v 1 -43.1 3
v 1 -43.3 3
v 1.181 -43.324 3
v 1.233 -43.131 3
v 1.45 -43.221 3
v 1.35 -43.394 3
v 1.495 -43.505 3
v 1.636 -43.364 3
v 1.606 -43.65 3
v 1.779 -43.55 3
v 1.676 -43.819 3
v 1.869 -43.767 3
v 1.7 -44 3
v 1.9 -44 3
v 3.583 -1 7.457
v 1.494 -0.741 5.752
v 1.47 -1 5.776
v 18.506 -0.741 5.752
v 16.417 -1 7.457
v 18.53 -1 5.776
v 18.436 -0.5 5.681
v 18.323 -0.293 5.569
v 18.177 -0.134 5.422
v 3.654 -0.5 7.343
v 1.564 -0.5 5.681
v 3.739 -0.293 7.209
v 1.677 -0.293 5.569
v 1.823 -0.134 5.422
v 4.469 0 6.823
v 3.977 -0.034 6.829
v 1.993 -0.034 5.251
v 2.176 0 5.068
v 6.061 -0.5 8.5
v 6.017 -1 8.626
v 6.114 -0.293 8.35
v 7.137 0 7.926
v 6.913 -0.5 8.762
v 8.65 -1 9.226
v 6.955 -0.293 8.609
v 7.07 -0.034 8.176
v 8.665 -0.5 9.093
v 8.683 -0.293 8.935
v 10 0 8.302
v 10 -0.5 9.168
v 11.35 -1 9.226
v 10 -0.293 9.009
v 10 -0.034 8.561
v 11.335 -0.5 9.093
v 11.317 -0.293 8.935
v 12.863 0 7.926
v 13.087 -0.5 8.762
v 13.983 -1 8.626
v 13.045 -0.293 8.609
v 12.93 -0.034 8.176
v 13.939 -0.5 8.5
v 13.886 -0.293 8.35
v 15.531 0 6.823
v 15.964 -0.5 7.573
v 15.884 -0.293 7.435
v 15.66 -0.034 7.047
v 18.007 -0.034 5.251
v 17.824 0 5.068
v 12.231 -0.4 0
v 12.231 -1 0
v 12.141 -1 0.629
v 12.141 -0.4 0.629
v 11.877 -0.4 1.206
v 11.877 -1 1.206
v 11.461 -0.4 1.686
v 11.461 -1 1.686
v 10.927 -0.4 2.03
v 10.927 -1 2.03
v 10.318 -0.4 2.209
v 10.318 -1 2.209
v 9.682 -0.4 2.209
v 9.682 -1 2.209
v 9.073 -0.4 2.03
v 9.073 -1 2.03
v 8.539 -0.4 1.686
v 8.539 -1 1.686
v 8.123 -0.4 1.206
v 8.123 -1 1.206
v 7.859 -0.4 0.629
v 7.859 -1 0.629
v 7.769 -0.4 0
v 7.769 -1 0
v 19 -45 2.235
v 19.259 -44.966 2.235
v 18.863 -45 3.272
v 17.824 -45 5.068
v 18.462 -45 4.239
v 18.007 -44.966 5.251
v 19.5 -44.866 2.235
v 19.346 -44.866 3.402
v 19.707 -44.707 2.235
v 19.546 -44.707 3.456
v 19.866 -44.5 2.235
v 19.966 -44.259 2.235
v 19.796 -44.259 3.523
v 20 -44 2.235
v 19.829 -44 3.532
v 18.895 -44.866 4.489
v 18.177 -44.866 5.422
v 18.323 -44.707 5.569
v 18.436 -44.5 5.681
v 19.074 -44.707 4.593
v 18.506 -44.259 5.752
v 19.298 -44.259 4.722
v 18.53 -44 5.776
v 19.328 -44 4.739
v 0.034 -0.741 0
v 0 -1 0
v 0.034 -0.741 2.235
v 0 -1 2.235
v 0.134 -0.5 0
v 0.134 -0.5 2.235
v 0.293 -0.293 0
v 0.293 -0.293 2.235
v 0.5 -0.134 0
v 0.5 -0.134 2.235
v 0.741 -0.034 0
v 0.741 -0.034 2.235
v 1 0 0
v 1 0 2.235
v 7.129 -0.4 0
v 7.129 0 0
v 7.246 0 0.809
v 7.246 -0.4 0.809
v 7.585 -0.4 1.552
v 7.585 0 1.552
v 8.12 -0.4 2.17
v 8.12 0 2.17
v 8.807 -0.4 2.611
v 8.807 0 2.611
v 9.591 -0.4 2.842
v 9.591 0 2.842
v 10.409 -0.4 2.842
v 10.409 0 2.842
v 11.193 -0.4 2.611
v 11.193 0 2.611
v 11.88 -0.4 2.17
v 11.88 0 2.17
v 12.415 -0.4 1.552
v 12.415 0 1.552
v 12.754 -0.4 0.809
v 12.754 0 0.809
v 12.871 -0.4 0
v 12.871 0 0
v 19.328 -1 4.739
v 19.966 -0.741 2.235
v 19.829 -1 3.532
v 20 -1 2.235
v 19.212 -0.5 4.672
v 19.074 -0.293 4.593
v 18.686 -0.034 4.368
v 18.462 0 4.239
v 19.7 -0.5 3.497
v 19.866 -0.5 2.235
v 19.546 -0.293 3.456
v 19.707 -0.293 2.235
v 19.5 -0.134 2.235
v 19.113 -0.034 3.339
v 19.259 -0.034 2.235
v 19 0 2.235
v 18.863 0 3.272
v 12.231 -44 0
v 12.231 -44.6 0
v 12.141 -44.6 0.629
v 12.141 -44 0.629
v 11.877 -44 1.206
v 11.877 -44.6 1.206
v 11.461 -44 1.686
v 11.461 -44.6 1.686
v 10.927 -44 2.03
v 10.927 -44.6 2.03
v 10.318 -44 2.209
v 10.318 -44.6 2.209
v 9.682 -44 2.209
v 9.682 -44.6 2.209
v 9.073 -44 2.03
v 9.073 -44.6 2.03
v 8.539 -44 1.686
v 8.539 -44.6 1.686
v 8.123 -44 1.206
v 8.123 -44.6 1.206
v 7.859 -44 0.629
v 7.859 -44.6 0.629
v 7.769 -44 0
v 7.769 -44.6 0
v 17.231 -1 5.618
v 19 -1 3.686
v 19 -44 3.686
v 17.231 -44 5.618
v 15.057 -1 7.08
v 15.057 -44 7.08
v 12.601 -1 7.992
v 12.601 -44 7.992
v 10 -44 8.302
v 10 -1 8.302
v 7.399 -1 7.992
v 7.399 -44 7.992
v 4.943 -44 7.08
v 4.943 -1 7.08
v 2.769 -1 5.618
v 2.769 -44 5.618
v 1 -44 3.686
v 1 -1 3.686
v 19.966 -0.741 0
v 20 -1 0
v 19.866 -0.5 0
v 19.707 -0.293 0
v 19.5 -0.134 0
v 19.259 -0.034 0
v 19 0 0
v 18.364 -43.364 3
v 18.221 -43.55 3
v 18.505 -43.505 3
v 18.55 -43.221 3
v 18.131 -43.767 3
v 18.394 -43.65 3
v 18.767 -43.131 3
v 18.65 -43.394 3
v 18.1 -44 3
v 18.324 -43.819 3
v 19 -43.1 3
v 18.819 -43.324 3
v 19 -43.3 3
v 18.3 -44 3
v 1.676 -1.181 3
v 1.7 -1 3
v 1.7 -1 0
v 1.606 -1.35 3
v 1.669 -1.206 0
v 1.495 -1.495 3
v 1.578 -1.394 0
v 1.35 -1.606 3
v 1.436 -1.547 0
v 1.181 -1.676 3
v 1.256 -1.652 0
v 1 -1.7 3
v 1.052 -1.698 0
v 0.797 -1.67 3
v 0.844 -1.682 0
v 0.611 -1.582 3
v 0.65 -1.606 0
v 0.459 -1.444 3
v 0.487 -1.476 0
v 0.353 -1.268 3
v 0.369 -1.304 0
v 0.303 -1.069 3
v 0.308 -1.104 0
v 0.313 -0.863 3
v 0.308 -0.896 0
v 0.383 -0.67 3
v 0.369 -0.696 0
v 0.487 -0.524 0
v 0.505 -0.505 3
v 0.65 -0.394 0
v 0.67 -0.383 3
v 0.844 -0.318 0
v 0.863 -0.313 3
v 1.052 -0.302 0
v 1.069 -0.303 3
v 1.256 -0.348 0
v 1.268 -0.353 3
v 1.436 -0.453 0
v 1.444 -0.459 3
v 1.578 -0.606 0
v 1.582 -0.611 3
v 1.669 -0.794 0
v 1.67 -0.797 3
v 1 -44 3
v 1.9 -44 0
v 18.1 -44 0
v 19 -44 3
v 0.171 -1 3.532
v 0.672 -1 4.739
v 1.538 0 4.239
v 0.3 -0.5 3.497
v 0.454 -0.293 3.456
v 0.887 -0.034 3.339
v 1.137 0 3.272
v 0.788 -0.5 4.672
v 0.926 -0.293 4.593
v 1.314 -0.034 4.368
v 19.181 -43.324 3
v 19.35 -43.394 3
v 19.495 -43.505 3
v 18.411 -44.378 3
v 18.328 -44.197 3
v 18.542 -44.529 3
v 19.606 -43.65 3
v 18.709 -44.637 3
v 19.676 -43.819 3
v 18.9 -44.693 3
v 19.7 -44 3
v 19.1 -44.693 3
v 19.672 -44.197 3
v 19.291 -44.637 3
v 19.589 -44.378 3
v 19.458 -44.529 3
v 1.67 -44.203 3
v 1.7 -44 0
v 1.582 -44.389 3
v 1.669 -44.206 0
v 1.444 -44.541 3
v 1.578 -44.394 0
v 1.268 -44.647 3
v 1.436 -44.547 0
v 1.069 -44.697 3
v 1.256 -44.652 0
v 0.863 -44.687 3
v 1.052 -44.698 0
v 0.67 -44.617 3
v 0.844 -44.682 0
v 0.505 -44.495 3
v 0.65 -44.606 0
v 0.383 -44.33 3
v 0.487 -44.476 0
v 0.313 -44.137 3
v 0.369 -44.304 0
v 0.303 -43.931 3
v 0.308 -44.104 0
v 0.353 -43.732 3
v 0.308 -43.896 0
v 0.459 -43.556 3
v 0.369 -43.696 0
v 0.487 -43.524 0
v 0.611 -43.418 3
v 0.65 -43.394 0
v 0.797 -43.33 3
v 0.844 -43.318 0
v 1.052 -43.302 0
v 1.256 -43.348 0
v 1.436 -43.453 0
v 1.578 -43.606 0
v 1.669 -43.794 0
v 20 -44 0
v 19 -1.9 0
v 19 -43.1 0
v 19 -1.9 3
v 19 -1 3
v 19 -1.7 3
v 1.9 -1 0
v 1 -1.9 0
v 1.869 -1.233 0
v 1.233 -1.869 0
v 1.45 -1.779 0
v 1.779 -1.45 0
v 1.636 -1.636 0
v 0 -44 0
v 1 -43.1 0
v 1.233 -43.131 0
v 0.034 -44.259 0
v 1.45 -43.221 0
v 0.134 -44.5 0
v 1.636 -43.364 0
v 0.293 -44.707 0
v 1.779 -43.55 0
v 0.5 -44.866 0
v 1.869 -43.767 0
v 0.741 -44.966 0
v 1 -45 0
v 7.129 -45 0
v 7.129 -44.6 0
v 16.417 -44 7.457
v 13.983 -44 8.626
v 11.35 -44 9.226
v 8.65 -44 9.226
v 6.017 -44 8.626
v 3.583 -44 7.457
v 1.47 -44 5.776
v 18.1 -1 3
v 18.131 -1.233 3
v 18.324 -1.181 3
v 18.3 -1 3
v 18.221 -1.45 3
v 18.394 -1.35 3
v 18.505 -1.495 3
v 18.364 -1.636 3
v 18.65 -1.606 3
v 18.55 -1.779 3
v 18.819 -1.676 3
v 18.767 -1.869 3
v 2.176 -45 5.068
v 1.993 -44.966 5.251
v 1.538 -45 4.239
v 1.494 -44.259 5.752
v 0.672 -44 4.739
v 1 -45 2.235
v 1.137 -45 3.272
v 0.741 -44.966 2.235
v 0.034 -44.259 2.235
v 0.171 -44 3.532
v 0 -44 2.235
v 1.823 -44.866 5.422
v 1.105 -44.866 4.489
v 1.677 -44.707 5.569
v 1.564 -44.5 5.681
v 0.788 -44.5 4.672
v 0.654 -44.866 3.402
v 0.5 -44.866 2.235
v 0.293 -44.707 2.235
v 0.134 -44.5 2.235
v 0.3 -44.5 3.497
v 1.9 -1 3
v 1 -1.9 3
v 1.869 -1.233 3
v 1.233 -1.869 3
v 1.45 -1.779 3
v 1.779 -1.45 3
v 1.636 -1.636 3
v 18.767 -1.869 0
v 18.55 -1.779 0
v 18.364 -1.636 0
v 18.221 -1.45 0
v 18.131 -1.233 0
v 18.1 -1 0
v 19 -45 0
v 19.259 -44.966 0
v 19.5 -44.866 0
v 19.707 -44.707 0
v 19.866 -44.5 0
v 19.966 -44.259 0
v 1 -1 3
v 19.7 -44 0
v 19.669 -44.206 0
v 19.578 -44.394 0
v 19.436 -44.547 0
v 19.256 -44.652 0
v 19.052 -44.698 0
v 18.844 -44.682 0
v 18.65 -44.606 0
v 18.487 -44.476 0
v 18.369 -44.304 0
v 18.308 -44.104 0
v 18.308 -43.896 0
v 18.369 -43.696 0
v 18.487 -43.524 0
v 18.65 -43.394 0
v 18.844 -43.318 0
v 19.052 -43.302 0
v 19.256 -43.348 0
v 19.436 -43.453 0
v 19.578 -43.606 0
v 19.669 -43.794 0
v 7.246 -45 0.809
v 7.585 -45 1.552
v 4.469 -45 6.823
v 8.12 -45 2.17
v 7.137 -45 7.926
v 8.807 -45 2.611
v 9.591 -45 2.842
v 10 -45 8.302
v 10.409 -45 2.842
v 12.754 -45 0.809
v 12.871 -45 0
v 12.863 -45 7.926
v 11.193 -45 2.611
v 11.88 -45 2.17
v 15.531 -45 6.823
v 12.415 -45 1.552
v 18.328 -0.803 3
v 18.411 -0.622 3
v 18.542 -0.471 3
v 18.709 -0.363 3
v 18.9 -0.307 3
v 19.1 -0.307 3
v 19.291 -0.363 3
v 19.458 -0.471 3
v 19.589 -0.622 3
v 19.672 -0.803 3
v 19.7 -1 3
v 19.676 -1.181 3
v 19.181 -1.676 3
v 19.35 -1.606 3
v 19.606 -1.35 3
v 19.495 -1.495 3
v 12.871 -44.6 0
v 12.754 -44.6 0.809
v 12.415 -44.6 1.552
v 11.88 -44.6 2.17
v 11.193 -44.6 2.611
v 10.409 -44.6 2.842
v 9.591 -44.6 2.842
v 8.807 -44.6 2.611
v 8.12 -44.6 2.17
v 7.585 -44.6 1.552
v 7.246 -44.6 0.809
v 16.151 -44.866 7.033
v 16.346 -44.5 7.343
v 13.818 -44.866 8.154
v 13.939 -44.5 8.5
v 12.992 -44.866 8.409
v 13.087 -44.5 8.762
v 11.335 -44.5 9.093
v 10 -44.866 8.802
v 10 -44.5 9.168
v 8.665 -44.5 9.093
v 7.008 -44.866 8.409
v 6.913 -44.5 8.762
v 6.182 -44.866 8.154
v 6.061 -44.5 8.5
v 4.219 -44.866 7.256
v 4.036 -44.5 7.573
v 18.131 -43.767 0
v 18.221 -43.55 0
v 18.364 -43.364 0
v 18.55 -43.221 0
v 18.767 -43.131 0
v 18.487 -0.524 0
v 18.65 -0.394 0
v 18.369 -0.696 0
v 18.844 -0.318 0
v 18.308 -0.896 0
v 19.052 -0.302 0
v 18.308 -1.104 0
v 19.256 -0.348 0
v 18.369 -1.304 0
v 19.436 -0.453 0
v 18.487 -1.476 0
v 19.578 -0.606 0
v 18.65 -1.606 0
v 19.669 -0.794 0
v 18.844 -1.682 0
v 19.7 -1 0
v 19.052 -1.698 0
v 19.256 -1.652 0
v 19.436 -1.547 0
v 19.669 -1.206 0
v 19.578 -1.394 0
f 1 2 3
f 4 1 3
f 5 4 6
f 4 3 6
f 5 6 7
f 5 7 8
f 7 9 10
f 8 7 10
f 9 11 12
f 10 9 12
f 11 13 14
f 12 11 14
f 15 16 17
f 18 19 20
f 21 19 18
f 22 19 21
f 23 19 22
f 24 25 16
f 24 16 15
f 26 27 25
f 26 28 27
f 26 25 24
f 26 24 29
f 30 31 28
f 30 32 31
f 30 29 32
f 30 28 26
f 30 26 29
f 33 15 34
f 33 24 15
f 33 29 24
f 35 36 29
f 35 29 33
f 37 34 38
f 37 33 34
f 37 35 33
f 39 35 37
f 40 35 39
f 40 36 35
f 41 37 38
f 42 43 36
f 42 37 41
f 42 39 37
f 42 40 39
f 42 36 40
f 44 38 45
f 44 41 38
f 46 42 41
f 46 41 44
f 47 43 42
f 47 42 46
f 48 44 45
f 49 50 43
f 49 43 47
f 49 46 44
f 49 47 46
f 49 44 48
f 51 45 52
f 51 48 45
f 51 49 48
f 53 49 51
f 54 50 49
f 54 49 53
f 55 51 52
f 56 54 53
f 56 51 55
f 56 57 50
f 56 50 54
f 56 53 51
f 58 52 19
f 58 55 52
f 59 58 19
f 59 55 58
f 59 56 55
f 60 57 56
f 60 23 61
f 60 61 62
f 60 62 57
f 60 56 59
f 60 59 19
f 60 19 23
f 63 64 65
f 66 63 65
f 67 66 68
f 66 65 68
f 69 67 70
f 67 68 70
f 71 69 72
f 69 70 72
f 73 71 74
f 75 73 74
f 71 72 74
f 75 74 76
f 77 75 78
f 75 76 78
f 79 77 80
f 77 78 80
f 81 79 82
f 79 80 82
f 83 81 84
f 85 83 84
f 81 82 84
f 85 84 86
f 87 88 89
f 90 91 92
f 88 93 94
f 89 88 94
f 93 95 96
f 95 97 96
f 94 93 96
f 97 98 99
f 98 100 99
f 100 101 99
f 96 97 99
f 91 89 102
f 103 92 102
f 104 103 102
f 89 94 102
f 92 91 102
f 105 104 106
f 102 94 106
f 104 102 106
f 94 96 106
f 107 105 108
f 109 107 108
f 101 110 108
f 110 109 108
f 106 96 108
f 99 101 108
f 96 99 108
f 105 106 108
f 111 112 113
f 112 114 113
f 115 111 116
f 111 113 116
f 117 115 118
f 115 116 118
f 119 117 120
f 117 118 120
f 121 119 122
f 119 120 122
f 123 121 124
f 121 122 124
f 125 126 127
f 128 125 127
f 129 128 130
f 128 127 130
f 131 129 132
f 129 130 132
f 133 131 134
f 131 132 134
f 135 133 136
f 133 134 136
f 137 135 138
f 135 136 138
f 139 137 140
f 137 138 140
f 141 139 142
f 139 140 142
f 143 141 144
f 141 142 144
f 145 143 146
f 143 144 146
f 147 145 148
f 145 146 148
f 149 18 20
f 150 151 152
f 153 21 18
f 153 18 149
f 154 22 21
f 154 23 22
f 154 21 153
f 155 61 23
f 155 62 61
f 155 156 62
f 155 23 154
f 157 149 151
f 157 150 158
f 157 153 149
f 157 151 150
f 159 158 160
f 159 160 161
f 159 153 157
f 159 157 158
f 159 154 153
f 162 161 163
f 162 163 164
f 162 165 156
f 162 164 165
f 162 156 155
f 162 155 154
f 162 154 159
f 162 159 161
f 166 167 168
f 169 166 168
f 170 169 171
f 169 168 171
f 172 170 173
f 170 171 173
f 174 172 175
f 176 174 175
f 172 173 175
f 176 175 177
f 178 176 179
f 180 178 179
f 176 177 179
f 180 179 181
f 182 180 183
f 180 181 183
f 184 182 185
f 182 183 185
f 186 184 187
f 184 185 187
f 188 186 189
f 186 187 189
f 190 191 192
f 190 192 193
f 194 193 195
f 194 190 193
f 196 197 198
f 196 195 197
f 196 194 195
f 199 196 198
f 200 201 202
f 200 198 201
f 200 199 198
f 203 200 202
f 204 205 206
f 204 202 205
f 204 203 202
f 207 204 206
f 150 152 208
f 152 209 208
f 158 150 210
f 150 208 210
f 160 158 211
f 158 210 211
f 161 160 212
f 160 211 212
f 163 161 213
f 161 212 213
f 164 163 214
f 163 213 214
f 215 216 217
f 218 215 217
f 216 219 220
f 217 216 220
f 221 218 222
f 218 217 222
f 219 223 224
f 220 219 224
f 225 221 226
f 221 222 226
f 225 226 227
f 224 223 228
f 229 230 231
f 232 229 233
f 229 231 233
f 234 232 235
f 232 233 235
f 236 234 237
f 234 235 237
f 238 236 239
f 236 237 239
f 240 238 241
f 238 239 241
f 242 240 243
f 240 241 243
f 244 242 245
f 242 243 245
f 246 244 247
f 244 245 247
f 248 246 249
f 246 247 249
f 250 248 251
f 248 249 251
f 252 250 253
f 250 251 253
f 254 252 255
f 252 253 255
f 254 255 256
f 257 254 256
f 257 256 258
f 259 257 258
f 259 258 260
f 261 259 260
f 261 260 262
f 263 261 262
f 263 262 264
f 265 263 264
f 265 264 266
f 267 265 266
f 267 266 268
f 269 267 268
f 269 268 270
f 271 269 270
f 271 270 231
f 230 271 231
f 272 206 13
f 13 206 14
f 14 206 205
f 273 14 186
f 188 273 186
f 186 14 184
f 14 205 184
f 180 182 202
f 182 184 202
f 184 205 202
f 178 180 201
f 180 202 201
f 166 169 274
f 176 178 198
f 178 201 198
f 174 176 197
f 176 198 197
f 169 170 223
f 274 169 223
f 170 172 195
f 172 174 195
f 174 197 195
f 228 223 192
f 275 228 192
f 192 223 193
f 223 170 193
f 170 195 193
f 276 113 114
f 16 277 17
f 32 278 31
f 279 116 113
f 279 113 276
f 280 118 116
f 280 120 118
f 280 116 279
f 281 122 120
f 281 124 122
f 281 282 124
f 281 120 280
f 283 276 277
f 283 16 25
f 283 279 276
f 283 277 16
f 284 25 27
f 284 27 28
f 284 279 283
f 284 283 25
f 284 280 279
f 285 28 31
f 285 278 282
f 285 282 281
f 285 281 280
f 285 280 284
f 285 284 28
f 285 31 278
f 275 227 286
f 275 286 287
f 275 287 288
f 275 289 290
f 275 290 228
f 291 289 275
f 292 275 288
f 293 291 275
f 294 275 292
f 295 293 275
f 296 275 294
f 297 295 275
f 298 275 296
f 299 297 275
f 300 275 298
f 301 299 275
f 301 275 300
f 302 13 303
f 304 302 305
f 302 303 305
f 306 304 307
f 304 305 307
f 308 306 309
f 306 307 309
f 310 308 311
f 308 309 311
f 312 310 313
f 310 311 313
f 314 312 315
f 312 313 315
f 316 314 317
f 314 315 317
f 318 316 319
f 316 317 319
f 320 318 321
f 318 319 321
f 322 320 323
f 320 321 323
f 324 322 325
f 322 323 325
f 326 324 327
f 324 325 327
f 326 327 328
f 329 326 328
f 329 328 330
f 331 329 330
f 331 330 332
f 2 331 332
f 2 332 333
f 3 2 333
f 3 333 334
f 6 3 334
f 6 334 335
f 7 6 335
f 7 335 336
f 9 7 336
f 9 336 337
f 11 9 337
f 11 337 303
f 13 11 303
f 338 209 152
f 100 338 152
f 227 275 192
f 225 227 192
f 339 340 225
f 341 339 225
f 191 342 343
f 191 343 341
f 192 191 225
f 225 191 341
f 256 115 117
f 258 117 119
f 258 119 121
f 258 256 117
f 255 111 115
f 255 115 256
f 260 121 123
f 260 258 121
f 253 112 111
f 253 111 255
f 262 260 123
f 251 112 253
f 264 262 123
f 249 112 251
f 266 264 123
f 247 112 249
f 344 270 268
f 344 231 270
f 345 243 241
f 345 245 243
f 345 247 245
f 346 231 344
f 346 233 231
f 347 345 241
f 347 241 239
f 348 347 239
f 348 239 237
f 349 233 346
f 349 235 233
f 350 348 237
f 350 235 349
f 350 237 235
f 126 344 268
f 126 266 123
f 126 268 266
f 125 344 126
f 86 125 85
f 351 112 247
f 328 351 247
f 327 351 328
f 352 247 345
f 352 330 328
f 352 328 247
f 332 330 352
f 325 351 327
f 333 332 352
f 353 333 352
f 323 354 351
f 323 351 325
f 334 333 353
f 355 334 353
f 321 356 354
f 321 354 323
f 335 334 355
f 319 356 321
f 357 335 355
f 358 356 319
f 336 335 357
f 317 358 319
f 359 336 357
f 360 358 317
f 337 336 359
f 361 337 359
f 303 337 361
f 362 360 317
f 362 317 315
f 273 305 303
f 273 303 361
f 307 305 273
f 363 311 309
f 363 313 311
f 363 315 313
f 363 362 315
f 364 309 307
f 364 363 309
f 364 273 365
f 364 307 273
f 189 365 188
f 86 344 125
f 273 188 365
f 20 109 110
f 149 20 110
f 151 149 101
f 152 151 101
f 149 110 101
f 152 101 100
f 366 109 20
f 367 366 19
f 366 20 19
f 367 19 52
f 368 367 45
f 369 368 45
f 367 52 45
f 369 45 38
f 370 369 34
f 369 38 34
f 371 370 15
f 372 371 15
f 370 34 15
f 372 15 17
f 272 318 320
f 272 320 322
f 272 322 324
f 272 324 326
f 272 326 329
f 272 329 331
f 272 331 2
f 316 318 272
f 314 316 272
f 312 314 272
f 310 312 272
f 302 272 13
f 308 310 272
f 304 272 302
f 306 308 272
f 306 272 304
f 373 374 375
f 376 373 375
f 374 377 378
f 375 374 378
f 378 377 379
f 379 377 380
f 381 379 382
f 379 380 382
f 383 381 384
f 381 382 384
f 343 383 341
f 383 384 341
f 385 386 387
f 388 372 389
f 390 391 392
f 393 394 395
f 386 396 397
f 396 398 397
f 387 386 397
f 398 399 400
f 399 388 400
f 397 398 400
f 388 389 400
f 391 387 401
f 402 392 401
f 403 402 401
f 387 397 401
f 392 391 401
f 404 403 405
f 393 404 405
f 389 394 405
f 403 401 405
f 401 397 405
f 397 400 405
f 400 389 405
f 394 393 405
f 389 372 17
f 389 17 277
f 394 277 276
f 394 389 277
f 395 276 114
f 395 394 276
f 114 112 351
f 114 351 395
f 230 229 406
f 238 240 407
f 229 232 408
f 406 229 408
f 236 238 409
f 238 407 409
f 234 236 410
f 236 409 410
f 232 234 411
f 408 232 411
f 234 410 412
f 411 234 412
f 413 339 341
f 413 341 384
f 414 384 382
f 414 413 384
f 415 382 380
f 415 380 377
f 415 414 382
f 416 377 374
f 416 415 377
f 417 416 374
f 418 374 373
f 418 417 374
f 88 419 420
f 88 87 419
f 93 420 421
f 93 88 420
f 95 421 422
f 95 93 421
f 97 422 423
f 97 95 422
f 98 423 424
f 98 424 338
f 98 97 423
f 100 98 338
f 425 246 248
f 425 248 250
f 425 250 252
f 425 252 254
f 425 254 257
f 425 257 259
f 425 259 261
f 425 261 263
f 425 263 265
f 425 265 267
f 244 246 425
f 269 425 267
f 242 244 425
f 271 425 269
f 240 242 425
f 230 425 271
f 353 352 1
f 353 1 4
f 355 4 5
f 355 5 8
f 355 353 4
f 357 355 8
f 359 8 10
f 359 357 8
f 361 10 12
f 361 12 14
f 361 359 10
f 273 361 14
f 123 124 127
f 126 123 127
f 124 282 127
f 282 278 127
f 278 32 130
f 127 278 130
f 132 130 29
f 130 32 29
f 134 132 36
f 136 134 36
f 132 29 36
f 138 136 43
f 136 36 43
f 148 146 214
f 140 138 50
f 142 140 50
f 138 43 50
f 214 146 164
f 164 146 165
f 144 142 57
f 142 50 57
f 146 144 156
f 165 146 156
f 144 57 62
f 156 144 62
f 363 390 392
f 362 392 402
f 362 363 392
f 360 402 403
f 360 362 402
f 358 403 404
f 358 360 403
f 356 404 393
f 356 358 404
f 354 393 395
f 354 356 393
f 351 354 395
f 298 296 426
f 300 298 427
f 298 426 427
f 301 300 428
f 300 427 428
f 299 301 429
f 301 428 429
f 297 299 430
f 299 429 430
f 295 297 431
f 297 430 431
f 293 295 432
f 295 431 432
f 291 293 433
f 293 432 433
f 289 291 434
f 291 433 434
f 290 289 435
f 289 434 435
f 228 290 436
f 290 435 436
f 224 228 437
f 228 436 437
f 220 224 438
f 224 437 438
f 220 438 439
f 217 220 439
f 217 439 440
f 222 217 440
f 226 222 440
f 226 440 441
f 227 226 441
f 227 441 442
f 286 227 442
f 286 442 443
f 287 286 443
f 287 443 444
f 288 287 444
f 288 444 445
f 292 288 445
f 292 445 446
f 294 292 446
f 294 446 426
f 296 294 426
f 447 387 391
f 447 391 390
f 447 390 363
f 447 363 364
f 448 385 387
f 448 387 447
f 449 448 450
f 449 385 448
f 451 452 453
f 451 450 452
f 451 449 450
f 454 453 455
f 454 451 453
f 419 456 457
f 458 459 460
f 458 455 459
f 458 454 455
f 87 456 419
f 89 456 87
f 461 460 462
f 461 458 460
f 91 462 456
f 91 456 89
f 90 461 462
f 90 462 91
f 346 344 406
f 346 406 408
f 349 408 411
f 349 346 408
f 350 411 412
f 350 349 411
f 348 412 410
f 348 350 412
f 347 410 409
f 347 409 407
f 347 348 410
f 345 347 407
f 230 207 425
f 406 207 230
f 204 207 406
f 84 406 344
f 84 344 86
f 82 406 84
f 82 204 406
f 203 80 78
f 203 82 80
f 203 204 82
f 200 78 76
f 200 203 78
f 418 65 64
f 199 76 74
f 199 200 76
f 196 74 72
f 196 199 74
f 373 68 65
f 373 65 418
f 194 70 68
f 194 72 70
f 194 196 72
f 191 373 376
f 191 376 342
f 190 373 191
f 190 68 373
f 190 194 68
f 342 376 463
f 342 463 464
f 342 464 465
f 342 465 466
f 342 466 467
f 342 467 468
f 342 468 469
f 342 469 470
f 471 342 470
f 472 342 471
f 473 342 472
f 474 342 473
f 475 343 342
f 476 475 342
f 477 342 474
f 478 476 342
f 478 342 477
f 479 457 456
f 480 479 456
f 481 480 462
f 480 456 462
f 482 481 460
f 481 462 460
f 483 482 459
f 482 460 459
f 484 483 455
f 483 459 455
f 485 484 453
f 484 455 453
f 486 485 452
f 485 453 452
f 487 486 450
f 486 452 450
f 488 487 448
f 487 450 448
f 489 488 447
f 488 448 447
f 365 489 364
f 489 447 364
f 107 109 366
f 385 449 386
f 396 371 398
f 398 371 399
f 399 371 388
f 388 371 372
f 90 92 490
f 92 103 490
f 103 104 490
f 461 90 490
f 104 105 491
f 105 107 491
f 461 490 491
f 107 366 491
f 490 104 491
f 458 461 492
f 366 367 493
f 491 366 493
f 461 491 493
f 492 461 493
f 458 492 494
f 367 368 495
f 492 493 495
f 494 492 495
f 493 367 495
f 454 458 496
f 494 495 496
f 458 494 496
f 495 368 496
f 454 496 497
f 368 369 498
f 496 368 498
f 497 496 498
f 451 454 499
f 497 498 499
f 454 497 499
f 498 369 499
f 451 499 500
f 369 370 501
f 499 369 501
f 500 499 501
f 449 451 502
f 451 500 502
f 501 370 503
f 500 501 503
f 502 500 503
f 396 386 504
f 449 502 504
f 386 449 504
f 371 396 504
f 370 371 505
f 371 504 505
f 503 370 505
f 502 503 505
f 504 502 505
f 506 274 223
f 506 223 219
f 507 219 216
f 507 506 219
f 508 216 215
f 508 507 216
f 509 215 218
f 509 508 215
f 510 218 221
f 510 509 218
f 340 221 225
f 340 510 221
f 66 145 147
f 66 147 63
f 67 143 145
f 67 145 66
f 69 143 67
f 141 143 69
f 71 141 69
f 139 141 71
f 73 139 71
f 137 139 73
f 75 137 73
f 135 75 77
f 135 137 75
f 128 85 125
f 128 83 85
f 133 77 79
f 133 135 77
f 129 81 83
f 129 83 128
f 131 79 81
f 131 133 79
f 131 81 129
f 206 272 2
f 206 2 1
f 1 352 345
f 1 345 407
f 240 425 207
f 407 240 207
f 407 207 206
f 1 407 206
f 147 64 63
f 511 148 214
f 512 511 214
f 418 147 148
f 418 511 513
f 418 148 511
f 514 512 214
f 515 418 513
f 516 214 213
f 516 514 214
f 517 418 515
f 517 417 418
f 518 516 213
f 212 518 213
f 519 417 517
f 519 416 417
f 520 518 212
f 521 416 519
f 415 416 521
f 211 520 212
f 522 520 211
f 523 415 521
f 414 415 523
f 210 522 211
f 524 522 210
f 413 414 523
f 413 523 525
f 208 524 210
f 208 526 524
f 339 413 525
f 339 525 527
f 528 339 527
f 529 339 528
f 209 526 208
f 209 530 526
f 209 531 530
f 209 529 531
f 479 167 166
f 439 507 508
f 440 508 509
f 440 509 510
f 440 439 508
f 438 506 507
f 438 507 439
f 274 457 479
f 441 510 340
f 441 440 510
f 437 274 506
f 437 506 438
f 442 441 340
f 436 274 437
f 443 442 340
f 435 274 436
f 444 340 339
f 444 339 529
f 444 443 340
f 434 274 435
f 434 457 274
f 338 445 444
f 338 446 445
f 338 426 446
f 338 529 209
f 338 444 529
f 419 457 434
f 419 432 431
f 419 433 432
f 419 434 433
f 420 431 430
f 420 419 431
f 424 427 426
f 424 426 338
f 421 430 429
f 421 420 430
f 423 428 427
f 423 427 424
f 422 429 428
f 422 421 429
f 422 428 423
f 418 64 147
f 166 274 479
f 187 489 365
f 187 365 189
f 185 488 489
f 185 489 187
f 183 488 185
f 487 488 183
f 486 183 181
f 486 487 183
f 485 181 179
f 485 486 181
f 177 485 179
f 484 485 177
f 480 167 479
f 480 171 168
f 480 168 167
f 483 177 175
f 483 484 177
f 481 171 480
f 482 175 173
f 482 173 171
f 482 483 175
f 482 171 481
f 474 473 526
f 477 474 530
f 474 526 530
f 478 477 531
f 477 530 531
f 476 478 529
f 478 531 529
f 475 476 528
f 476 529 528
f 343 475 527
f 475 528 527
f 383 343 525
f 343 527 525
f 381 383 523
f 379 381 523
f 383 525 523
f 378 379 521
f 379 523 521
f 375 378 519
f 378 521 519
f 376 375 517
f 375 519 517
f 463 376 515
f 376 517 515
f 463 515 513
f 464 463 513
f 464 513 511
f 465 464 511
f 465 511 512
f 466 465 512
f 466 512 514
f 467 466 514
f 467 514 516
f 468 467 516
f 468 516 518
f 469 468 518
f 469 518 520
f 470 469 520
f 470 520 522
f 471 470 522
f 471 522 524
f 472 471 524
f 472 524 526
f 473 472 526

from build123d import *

# Parameters (mm, degrees)
F0_W      = 20
F0_H      = 4
F1_DEPTH  = 45
F2_T      = -1
F3_R      = 5
F4_R      = 5
F6_DEPTH  = 3
F7_R      = 0.7
F8_DEPTH  = 3
F9_R      = 1
F10_R     = 1
F12_DEPTH = 50
F13_DEPTH = 0.4
F15_DEPTH = 0.4


with BuildPart() as f1:
    # F0 (on Front) → F1 (new body)
    with BuildSketch(Plane.XZ):
        with Locations((10, 2)):
            Rectangle(F0_W, F0_H)
        with BuildLine():
            ThreePointArc((20, 4), (10, 9.301808562), (0, 4))
            Line((0, 4), (20, 4))
        make_face()
    extrude(amount=F1_DEPTH)

    # F2
    f2_openings = [f1.faces().sort_by_distance(p)[0] for p in [
        (10, -22.5, 0),
    ]]
    offset(amount=F2_T, openings=f2_openings)

    # F3
    f3_edges = [f1.edges().sort_by_distance(p)[0] for p in [
        (0, -22.5, 4),
    ]]
    fillet(f3_edges, radius=F3_R)

    # F4
    f4_edges = [f1.edges().sort_by_distance(p)[0] for p in [
        (20, -22.5, 4),
    ]]
    fillet(f4_edges, radius=F4_R)

    # F5 (on face) → F6 (join)
    with BuildSketch(Plane(origin=(0, 0, 0), x_dir=(1, 0, 0), z_dir=(0, 0, -1))):
        with BuildLine():
            Line((1, 1), (1.9, 1))
            ThreePointArc((1.9, 1), (1.6363961031, 1.6363961031), (1, 1.9))
            Line((1, 1.9), (1, 1))
        make_face()
        with BuildLine():
            ThreePointArc((19, 1.9), (18.3636038969, 1.6363961031), (18.1, 1))
            Line((18.1, 1), (19, 1))
            Line((19, 1), (19, 1.9))
        make_face()
        with BuildLine():
            ThreePointArc((18.1, 44), (18.3636038969, 43.3636038969), (19, 43.1))
            Line((19, 43.1), (19, 44))
            Line((19, 44), (18.1, 44))
        make_face()
        with BuildLine():
            Line((1, 44), (1, 43.1))
            ThreePointArc((1, 43.1), (1.6363961031, 43.3636038969), (1.9, 44))
            Line((1.9, 44), (1, 44))
        make_face()
    extrude(amount=-F6_DEPTH)

    # F7 (on face) → F8 (cut)
    with BuildSketch(Plane(origin=(0, 0, 0), x_dir=(1, 0, 0), z_dir=(0, 0, -1))):
        with Locations((1, 1)):
            Circle(F7_R)
        with Locations((19, 1)):
            Circle(F7_R)
        with Locations((1, 44)):
            Circle(F7_R)
        with Locations((19, 44)):
            Circle(F7_R)
    extrude(amount=-F8_DEPTH, mode=Mode.SUBTRACT)

    # F9
    f9_edges = [f1.edges().sort_by_distance(p)[0] for p in [
        (20, -45, 1.117556),
        (19.617968, -45, 4.151977),
        (10, -45, 9.301809),
        (0.382032, -45, 4.151977),
        (0, -45, 1.117556),
    ]]
    fillet(f9_edges, radius=F9_R)

    # F10
    f10_edges = [f1.edges().sort_by_distance(p)[0] for p in [
        (0, 0, 1.117556),
        (0.382032, 0, 4.151977),
        (10, 0, 9.301809),
        (19.617968, 0, 4.151977),
        (20, 0, 1.117556),
    ]]
    fillet(f10_edges, radius=F10_R)

    # F11 (on face) → F12 (cut)
    with BuildSketch(Plane.XZ.offset(45)):
        with BuildLine():
            Line((7.7686794017, 0), (12.2313205983, 0))
            ThreePointArc((12.2313205983, 0), (10, 2.2313205983), (7.7686794017, 0))
        make_face()
    extrude(amount=-F12_DEPTH, mode=Mode.SUBTRACT)

    # F11 (on face) → F13 (cut)
    with BuildSketch(Plane.XZ.offset(45)):
        with BuildLine():
            Line((12.2313205983, 0), (12.8707642747, 0))
            ThreePointArc((12.8707642747, 0), (10, 2.8707642747), (7.1292357253, 0))
            Line((7.1292357253, 0), (7.7686794017, 0))
            ThreePointArc((7.7686794017, 0), (10, 2.2313205983), (12.2313205983, 0))
        make_face()
    extrude(amount=-F13_DEPTH, mode=Mode.SUBTRACT)

    # F14 (on face) → F15 (cut)
    with BuildSketch(Plane(origin=(0, 0, 0), x_dir=(-1, 0, 0), z_dir=(0, 1, 0))):
        with BuildLine():
            Line((-7.7686794017, 0), (-7.1292357253, 0))
            ThreePointArc((-7.1292357253, 0), (-10, 2.8707642747), (-12.8707642747, 0))
            Line((-12.8707642747, 0), (-12.2313205983, 0))
            ThreePointArc((-12.2313205983, 0), (-10, 2.2313205983), (-7.7686794017, 0))
        make_face()
    extrude(amount=-F15_DEPTH, mode=Mode.SUBTRACT)


solid = f1.part
